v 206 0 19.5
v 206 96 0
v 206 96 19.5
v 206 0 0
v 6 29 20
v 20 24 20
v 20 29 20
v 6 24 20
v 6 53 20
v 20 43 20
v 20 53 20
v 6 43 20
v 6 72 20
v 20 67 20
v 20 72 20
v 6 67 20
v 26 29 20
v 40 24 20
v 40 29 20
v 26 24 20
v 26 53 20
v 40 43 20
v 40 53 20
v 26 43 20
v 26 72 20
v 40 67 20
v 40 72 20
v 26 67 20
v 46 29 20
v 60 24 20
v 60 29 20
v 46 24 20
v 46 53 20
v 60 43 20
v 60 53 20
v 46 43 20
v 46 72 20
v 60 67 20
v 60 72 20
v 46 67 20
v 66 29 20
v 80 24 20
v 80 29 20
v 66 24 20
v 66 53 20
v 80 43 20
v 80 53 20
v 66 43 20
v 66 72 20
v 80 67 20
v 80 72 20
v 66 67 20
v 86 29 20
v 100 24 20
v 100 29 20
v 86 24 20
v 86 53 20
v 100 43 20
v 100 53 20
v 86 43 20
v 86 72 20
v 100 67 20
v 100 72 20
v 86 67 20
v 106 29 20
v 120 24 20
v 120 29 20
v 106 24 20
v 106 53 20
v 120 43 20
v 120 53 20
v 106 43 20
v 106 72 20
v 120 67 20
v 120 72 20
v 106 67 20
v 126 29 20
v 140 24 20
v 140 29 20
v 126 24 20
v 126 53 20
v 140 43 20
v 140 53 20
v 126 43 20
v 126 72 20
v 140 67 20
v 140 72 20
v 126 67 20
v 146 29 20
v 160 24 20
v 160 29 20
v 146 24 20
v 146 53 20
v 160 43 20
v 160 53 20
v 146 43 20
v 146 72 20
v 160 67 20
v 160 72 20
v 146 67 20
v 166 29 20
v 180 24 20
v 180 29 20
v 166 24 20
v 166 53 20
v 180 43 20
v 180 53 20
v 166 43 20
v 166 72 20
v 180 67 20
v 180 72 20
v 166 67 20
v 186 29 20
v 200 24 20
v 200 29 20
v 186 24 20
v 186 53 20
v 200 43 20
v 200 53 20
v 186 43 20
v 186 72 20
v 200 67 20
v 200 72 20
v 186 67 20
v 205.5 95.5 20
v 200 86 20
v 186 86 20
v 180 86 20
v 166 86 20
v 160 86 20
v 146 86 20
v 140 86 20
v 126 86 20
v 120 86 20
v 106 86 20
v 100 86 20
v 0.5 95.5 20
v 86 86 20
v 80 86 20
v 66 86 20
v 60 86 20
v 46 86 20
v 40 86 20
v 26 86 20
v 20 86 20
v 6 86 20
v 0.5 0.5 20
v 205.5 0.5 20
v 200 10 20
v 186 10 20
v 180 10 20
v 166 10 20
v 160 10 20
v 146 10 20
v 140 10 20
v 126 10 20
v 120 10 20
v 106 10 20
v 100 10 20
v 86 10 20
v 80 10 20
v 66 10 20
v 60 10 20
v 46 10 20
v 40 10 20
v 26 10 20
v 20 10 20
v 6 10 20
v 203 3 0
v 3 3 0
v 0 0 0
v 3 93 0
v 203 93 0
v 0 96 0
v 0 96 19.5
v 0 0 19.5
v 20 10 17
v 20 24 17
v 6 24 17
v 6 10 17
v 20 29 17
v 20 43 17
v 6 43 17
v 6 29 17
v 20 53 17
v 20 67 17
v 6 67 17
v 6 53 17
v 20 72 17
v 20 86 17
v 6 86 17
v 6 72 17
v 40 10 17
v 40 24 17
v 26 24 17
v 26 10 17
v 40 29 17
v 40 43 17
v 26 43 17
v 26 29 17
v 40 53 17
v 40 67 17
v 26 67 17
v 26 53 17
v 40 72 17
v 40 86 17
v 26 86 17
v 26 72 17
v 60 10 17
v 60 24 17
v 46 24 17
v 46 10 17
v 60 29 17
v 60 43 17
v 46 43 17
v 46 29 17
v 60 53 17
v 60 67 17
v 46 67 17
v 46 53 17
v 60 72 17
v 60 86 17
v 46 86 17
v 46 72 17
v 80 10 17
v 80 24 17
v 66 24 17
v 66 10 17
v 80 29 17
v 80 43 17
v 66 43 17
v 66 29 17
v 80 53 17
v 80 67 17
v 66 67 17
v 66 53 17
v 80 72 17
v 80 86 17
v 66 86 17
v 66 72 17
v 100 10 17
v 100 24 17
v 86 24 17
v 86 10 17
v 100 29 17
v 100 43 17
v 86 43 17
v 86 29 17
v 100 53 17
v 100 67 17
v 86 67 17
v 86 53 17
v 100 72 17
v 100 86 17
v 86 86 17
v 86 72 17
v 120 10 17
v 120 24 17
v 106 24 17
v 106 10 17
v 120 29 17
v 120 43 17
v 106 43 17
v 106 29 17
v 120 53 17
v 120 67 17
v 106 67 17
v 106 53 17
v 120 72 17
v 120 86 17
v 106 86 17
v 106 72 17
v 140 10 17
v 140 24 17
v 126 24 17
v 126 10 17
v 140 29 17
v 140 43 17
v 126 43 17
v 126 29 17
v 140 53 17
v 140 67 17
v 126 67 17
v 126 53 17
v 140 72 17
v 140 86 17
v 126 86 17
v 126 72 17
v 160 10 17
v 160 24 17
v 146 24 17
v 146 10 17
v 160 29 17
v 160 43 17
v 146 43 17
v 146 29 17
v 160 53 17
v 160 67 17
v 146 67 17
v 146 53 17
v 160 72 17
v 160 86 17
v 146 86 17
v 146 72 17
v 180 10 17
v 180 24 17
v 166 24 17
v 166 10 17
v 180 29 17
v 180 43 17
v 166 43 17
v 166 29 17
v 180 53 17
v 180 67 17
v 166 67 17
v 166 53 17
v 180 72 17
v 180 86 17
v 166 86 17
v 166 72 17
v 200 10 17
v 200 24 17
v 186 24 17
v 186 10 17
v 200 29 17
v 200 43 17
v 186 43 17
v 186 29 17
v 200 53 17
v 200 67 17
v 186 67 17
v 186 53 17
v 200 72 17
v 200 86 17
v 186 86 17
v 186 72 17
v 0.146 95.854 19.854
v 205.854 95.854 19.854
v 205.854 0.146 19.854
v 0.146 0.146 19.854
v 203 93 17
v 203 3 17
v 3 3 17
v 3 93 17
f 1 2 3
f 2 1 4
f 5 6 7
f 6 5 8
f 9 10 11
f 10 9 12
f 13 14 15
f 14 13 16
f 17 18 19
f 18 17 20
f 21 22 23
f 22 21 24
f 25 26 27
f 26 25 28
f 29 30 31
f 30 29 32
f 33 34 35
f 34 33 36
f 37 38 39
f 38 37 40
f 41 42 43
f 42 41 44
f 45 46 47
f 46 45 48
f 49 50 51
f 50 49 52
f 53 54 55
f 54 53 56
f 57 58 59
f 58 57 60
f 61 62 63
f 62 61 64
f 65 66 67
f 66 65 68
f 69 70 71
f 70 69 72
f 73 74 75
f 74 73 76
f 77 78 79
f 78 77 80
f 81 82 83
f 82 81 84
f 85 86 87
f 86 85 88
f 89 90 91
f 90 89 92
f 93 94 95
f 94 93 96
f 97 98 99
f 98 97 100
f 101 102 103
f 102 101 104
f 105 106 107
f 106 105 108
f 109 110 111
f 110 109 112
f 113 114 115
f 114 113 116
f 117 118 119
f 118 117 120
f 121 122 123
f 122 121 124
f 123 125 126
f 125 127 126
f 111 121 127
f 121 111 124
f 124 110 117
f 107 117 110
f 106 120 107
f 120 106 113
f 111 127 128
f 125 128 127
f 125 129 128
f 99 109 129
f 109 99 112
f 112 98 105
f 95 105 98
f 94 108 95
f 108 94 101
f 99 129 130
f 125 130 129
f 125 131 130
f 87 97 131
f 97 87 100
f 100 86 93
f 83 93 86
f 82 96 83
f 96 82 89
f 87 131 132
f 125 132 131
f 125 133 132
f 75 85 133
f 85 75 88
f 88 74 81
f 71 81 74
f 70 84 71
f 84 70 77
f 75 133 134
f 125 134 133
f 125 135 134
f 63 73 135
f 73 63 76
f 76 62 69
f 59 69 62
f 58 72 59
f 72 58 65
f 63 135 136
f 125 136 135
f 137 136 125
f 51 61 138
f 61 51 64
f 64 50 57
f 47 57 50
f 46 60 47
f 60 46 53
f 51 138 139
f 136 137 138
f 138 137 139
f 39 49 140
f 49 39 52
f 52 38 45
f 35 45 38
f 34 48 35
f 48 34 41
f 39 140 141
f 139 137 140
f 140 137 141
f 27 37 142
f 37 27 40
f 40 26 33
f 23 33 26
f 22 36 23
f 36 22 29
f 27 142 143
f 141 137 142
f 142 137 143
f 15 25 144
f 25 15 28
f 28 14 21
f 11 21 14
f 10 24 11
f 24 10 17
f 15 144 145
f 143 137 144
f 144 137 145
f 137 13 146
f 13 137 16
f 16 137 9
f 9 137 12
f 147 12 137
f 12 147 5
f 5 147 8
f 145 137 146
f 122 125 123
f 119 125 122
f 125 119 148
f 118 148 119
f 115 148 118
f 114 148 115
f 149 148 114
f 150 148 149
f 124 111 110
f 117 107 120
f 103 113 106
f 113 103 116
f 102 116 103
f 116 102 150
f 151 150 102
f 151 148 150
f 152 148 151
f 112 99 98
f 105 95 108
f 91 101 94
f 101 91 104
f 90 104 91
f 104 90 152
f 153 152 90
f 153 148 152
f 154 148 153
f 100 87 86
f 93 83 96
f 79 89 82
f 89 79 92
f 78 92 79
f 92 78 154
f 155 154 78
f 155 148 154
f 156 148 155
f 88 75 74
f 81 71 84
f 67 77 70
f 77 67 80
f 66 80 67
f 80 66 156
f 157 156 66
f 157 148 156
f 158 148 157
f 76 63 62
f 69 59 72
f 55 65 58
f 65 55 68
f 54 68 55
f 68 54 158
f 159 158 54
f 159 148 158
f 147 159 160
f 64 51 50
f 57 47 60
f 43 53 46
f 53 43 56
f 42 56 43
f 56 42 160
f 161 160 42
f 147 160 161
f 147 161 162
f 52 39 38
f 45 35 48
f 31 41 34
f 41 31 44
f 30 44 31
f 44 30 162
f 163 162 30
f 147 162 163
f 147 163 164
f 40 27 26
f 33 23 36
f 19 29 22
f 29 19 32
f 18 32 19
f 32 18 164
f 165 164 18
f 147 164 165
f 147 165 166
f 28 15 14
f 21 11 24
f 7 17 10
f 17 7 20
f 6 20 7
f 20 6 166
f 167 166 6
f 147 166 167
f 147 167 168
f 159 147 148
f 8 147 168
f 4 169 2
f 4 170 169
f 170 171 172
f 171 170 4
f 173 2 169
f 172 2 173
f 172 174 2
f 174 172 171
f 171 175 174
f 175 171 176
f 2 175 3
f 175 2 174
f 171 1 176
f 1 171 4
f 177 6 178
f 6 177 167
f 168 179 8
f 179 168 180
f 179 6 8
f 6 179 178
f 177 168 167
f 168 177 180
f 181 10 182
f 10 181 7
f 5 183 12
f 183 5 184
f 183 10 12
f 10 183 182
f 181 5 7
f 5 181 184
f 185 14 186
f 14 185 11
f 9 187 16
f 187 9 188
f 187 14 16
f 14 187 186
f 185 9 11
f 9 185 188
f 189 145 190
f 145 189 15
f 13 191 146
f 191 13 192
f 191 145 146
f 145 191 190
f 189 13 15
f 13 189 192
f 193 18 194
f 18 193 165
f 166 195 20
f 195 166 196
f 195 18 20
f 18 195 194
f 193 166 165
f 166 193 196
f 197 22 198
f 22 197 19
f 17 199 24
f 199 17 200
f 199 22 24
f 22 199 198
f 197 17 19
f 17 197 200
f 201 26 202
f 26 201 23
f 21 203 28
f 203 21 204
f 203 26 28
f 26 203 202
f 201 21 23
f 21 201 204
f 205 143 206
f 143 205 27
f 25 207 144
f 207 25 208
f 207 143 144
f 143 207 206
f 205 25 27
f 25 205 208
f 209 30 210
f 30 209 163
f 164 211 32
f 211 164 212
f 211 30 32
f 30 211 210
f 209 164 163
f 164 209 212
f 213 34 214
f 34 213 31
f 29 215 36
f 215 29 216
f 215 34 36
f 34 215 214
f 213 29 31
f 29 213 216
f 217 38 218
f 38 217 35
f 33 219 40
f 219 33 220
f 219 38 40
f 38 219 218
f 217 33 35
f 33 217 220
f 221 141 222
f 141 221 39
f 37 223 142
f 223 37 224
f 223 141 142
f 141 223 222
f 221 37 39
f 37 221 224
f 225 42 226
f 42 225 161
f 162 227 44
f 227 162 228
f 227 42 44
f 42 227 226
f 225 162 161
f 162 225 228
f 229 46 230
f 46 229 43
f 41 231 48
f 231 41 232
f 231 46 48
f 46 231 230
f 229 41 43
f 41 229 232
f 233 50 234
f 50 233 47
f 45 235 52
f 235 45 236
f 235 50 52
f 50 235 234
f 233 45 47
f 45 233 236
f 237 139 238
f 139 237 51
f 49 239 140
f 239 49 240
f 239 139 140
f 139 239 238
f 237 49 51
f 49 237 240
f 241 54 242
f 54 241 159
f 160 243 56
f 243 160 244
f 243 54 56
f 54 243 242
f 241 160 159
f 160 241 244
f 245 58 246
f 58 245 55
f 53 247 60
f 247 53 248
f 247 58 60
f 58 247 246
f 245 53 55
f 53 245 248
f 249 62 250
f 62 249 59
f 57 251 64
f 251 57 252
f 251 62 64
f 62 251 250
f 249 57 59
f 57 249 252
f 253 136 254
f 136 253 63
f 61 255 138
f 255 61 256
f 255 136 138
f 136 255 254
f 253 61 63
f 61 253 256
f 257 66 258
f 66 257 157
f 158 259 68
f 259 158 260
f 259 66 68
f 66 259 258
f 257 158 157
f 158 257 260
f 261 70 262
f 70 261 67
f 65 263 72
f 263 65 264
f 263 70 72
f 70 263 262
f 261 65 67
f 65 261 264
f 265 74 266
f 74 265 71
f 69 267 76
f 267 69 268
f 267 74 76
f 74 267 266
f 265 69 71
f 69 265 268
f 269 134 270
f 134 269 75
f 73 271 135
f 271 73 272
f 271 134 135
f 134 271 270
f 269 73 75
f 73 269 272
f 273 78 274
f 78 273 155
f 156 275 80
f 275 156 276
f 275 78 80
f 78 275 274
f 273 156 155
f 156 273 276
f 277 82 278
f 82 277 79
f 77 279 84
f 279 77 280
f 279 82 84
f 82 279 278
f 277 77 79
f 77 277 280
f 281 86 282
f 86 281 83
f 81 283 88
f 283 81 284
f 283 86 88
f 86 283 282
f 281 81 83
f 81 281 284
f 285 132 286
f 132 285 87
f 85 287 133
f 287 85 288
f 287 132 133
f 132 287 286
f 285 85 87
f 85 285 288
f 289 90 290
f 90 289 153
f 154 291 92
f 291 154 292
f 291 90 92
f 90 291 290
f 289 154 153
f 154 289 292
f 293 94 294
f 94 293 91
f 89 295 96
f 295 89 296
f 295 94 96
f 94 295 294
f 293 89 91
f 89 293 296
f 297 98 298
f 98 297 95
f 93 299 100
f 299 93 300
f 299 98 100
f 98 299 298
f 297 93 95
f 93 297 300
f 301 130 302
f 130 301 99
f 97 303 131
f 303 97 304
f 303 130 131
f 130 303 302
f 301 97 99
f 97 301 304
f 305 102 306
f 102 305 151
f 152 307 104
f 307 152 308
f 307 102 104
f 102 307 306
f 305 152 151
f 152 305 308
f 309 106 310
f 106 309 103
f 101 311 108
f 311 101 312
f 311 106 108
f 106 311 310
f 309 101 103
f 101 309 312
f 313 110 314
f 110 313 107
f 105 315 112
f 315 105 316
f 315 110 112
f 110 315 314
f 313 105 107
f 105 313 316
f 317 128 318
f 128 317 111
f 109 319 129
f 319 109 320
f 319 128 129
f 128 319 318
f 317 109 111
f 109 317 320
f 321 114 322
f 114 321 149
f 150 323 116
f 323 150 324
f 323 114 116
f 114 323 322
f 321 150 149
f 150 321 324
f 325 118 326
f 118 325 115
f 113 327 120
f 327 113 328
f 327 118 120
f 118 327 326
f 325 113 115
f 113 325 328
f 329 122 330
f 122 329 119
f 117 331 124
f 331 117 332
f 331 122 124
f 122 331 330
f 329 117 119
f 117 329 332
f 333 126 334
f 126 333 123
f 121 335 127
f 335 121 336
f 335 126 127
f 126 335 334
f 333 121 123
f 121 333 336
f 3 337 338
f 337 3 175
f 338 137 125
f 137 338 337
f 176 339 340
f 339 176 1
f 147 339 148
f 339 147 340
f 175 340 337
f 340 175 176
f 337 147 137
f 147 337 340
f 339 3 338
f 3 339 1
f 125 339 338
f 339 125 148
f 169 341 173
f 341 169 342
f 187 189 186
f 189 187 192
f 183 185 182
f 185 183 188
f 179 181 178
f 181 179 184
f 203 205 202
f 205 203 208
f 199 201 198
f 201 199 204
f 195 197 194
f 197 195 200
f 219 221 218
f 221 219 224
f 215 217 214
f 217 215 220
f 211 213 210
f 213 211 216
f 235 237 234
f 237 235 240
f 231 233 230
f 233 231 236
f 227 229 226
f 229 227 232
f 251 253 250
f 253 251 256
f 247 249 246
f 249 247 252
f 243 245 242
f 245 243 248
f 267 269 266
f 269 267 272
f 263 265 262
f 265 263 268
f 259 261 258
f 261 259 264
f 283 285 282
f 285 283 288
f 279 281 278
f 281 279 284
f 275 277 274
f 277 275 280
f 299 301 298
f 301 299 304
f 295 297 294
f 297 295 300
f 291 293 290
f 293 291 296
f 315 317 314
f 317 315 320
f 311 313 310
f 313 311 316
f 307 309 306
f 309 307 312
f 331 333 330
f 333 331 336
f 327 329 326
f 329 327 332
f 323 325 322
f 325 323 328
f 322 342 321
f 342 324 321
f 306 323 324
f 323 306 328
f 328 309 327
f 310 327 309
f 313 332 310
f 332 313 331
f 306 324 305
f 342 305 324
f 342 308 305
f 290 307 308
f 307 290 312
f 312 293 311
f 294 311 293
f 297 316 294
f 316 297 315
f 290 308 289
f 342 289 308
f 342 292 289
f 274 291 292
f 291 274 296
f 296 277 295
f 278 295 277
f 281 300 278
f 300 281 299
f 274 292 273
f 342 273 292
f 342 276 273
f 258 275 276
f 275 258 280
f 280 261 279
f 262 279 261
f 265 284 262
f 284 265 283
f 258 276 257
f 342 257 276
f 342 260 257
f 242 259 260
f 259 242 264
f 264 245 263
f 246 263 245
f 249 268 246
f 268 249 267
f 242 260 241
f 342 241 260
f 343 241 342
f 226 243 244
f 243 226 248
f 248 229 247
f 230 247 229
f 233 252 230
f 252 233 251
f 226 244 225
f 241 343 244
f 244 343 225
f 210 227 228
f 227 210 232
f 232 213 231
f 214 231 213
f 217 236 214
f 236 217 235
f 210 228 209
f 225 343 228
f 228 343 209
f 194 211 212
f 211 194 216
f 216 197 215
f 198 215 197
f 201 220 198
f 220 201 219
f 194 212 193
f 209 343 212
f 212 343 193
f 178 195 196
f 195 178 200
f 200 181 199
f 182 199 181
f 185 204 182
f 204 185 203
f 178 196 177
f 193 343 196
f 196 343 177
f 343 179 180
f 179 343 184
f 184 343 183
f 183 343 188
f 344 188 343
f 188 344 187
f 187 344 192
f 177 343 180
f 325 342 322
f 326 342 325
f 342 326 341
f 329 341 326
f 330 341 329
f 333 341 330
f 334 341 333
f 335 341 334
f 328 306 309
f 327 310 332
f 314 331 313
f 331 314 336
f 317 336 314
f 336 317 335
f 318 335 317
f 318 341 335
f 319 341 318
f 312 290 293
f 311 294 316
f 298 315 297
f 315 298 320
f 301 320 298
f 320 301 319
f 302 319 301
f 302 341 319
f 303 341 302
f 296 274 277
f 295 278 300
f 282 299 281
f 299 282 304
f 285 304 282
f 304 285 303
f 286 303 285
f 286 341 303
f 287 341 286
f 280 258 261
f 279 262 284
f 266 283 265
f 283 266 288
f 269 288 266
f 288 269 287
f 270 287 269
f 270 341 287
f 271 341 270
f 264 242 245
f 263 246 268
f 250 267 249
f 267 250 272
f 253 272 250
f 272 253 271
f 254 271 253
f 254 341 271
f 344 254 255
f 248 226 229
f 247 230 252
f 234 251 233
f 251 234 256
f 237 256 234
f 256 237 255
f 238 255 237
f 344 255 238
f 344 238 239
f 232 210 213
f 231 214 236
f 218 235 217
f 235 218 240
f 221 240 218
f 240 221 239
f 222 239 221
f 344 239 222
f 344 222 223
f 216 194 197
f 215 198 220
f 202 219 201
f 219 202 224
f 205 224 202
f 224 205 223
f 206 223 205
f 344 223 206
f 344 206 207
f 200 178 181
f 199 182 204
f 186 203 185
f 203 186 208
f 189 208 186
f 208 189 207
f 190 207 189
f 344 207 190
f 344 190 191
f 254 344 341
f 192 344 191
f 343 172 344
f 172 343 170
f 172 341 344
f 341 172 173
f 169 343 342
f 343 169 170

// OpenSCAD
$fa = 1;
$fs = 0.4;

// general config
thickness = 3;
overlap = .01;

// cutout module
switch_size = 14;
module cutout(offset_x = 0, offset_y = 0, offset_z = 0)
{
    translate([ offset_x, offset_y, offset_z ])
        cube([ switch_size, switch_size, height + overlap ]);
}

module column(left_x)
{
    cutout(left_x, bottom_sep);
    cutout(left_x, bottom_sep + switch_size + inner_sep);

    cutout(left_x, 2 * bottom_sep + 2 * switch_size + inner_sep);
    cutout(left_x, 2 * bottom_sep + 3 * switch_size + 2 * inner_sep);
}

module edge_fillet(length, rotate, shift, radius=1){
    translate(shift)
        rotate(rotate)
        difference(){
            cube([length, radius, radius], center=true);
            translate([0,-radius/2,-radius/2])
                rotate([0,90,0])
                    cylinder(r=radius/2, h=2*length, center=true);
        }
}

// main tester
height = 20;

inner_sep = 5;
lr_sep = 6;
bottom_sep = 10;

// cube([ width, length, height ]);
num_columns = 10;
total_width = lr_sep + num_columns * (lr_sep + switch_size);
total_length = 2 * bottom_sep + 2 * inner_sep + 4 * switch_size + bottom_sep;


difference()
{
    union(){
        cube([ total_width, total_length, height ]);
        translate([ total_width / 2, total_length / 2, height / 2 ])
            cube([ total_width, thickness, height ], center = true);
    }

    for (i = [0:num_columns - 1])
        column(lr_sep + i * (lr_sep + switch_size));
    translate([ thickness, thickness, -overlap ]) cube([
        total_width - 2 * thickness,
        total_length - 2 * thickness,
        height + overlap -
        thickness
    ]);

    // fillets on top edges
    edge_fillet(total_width, [0,0,0], [total_width/2,total_length, height]);
    edge_fillet(total_width, [0,0,180], [total_width/2,0, height]);
    edge_fillet(total_length,[0,0,90],[0,total_length/2,height]);
    edge_fillet(total_length,[0,0,-90],[total_width,total_length/2,height]);
}
